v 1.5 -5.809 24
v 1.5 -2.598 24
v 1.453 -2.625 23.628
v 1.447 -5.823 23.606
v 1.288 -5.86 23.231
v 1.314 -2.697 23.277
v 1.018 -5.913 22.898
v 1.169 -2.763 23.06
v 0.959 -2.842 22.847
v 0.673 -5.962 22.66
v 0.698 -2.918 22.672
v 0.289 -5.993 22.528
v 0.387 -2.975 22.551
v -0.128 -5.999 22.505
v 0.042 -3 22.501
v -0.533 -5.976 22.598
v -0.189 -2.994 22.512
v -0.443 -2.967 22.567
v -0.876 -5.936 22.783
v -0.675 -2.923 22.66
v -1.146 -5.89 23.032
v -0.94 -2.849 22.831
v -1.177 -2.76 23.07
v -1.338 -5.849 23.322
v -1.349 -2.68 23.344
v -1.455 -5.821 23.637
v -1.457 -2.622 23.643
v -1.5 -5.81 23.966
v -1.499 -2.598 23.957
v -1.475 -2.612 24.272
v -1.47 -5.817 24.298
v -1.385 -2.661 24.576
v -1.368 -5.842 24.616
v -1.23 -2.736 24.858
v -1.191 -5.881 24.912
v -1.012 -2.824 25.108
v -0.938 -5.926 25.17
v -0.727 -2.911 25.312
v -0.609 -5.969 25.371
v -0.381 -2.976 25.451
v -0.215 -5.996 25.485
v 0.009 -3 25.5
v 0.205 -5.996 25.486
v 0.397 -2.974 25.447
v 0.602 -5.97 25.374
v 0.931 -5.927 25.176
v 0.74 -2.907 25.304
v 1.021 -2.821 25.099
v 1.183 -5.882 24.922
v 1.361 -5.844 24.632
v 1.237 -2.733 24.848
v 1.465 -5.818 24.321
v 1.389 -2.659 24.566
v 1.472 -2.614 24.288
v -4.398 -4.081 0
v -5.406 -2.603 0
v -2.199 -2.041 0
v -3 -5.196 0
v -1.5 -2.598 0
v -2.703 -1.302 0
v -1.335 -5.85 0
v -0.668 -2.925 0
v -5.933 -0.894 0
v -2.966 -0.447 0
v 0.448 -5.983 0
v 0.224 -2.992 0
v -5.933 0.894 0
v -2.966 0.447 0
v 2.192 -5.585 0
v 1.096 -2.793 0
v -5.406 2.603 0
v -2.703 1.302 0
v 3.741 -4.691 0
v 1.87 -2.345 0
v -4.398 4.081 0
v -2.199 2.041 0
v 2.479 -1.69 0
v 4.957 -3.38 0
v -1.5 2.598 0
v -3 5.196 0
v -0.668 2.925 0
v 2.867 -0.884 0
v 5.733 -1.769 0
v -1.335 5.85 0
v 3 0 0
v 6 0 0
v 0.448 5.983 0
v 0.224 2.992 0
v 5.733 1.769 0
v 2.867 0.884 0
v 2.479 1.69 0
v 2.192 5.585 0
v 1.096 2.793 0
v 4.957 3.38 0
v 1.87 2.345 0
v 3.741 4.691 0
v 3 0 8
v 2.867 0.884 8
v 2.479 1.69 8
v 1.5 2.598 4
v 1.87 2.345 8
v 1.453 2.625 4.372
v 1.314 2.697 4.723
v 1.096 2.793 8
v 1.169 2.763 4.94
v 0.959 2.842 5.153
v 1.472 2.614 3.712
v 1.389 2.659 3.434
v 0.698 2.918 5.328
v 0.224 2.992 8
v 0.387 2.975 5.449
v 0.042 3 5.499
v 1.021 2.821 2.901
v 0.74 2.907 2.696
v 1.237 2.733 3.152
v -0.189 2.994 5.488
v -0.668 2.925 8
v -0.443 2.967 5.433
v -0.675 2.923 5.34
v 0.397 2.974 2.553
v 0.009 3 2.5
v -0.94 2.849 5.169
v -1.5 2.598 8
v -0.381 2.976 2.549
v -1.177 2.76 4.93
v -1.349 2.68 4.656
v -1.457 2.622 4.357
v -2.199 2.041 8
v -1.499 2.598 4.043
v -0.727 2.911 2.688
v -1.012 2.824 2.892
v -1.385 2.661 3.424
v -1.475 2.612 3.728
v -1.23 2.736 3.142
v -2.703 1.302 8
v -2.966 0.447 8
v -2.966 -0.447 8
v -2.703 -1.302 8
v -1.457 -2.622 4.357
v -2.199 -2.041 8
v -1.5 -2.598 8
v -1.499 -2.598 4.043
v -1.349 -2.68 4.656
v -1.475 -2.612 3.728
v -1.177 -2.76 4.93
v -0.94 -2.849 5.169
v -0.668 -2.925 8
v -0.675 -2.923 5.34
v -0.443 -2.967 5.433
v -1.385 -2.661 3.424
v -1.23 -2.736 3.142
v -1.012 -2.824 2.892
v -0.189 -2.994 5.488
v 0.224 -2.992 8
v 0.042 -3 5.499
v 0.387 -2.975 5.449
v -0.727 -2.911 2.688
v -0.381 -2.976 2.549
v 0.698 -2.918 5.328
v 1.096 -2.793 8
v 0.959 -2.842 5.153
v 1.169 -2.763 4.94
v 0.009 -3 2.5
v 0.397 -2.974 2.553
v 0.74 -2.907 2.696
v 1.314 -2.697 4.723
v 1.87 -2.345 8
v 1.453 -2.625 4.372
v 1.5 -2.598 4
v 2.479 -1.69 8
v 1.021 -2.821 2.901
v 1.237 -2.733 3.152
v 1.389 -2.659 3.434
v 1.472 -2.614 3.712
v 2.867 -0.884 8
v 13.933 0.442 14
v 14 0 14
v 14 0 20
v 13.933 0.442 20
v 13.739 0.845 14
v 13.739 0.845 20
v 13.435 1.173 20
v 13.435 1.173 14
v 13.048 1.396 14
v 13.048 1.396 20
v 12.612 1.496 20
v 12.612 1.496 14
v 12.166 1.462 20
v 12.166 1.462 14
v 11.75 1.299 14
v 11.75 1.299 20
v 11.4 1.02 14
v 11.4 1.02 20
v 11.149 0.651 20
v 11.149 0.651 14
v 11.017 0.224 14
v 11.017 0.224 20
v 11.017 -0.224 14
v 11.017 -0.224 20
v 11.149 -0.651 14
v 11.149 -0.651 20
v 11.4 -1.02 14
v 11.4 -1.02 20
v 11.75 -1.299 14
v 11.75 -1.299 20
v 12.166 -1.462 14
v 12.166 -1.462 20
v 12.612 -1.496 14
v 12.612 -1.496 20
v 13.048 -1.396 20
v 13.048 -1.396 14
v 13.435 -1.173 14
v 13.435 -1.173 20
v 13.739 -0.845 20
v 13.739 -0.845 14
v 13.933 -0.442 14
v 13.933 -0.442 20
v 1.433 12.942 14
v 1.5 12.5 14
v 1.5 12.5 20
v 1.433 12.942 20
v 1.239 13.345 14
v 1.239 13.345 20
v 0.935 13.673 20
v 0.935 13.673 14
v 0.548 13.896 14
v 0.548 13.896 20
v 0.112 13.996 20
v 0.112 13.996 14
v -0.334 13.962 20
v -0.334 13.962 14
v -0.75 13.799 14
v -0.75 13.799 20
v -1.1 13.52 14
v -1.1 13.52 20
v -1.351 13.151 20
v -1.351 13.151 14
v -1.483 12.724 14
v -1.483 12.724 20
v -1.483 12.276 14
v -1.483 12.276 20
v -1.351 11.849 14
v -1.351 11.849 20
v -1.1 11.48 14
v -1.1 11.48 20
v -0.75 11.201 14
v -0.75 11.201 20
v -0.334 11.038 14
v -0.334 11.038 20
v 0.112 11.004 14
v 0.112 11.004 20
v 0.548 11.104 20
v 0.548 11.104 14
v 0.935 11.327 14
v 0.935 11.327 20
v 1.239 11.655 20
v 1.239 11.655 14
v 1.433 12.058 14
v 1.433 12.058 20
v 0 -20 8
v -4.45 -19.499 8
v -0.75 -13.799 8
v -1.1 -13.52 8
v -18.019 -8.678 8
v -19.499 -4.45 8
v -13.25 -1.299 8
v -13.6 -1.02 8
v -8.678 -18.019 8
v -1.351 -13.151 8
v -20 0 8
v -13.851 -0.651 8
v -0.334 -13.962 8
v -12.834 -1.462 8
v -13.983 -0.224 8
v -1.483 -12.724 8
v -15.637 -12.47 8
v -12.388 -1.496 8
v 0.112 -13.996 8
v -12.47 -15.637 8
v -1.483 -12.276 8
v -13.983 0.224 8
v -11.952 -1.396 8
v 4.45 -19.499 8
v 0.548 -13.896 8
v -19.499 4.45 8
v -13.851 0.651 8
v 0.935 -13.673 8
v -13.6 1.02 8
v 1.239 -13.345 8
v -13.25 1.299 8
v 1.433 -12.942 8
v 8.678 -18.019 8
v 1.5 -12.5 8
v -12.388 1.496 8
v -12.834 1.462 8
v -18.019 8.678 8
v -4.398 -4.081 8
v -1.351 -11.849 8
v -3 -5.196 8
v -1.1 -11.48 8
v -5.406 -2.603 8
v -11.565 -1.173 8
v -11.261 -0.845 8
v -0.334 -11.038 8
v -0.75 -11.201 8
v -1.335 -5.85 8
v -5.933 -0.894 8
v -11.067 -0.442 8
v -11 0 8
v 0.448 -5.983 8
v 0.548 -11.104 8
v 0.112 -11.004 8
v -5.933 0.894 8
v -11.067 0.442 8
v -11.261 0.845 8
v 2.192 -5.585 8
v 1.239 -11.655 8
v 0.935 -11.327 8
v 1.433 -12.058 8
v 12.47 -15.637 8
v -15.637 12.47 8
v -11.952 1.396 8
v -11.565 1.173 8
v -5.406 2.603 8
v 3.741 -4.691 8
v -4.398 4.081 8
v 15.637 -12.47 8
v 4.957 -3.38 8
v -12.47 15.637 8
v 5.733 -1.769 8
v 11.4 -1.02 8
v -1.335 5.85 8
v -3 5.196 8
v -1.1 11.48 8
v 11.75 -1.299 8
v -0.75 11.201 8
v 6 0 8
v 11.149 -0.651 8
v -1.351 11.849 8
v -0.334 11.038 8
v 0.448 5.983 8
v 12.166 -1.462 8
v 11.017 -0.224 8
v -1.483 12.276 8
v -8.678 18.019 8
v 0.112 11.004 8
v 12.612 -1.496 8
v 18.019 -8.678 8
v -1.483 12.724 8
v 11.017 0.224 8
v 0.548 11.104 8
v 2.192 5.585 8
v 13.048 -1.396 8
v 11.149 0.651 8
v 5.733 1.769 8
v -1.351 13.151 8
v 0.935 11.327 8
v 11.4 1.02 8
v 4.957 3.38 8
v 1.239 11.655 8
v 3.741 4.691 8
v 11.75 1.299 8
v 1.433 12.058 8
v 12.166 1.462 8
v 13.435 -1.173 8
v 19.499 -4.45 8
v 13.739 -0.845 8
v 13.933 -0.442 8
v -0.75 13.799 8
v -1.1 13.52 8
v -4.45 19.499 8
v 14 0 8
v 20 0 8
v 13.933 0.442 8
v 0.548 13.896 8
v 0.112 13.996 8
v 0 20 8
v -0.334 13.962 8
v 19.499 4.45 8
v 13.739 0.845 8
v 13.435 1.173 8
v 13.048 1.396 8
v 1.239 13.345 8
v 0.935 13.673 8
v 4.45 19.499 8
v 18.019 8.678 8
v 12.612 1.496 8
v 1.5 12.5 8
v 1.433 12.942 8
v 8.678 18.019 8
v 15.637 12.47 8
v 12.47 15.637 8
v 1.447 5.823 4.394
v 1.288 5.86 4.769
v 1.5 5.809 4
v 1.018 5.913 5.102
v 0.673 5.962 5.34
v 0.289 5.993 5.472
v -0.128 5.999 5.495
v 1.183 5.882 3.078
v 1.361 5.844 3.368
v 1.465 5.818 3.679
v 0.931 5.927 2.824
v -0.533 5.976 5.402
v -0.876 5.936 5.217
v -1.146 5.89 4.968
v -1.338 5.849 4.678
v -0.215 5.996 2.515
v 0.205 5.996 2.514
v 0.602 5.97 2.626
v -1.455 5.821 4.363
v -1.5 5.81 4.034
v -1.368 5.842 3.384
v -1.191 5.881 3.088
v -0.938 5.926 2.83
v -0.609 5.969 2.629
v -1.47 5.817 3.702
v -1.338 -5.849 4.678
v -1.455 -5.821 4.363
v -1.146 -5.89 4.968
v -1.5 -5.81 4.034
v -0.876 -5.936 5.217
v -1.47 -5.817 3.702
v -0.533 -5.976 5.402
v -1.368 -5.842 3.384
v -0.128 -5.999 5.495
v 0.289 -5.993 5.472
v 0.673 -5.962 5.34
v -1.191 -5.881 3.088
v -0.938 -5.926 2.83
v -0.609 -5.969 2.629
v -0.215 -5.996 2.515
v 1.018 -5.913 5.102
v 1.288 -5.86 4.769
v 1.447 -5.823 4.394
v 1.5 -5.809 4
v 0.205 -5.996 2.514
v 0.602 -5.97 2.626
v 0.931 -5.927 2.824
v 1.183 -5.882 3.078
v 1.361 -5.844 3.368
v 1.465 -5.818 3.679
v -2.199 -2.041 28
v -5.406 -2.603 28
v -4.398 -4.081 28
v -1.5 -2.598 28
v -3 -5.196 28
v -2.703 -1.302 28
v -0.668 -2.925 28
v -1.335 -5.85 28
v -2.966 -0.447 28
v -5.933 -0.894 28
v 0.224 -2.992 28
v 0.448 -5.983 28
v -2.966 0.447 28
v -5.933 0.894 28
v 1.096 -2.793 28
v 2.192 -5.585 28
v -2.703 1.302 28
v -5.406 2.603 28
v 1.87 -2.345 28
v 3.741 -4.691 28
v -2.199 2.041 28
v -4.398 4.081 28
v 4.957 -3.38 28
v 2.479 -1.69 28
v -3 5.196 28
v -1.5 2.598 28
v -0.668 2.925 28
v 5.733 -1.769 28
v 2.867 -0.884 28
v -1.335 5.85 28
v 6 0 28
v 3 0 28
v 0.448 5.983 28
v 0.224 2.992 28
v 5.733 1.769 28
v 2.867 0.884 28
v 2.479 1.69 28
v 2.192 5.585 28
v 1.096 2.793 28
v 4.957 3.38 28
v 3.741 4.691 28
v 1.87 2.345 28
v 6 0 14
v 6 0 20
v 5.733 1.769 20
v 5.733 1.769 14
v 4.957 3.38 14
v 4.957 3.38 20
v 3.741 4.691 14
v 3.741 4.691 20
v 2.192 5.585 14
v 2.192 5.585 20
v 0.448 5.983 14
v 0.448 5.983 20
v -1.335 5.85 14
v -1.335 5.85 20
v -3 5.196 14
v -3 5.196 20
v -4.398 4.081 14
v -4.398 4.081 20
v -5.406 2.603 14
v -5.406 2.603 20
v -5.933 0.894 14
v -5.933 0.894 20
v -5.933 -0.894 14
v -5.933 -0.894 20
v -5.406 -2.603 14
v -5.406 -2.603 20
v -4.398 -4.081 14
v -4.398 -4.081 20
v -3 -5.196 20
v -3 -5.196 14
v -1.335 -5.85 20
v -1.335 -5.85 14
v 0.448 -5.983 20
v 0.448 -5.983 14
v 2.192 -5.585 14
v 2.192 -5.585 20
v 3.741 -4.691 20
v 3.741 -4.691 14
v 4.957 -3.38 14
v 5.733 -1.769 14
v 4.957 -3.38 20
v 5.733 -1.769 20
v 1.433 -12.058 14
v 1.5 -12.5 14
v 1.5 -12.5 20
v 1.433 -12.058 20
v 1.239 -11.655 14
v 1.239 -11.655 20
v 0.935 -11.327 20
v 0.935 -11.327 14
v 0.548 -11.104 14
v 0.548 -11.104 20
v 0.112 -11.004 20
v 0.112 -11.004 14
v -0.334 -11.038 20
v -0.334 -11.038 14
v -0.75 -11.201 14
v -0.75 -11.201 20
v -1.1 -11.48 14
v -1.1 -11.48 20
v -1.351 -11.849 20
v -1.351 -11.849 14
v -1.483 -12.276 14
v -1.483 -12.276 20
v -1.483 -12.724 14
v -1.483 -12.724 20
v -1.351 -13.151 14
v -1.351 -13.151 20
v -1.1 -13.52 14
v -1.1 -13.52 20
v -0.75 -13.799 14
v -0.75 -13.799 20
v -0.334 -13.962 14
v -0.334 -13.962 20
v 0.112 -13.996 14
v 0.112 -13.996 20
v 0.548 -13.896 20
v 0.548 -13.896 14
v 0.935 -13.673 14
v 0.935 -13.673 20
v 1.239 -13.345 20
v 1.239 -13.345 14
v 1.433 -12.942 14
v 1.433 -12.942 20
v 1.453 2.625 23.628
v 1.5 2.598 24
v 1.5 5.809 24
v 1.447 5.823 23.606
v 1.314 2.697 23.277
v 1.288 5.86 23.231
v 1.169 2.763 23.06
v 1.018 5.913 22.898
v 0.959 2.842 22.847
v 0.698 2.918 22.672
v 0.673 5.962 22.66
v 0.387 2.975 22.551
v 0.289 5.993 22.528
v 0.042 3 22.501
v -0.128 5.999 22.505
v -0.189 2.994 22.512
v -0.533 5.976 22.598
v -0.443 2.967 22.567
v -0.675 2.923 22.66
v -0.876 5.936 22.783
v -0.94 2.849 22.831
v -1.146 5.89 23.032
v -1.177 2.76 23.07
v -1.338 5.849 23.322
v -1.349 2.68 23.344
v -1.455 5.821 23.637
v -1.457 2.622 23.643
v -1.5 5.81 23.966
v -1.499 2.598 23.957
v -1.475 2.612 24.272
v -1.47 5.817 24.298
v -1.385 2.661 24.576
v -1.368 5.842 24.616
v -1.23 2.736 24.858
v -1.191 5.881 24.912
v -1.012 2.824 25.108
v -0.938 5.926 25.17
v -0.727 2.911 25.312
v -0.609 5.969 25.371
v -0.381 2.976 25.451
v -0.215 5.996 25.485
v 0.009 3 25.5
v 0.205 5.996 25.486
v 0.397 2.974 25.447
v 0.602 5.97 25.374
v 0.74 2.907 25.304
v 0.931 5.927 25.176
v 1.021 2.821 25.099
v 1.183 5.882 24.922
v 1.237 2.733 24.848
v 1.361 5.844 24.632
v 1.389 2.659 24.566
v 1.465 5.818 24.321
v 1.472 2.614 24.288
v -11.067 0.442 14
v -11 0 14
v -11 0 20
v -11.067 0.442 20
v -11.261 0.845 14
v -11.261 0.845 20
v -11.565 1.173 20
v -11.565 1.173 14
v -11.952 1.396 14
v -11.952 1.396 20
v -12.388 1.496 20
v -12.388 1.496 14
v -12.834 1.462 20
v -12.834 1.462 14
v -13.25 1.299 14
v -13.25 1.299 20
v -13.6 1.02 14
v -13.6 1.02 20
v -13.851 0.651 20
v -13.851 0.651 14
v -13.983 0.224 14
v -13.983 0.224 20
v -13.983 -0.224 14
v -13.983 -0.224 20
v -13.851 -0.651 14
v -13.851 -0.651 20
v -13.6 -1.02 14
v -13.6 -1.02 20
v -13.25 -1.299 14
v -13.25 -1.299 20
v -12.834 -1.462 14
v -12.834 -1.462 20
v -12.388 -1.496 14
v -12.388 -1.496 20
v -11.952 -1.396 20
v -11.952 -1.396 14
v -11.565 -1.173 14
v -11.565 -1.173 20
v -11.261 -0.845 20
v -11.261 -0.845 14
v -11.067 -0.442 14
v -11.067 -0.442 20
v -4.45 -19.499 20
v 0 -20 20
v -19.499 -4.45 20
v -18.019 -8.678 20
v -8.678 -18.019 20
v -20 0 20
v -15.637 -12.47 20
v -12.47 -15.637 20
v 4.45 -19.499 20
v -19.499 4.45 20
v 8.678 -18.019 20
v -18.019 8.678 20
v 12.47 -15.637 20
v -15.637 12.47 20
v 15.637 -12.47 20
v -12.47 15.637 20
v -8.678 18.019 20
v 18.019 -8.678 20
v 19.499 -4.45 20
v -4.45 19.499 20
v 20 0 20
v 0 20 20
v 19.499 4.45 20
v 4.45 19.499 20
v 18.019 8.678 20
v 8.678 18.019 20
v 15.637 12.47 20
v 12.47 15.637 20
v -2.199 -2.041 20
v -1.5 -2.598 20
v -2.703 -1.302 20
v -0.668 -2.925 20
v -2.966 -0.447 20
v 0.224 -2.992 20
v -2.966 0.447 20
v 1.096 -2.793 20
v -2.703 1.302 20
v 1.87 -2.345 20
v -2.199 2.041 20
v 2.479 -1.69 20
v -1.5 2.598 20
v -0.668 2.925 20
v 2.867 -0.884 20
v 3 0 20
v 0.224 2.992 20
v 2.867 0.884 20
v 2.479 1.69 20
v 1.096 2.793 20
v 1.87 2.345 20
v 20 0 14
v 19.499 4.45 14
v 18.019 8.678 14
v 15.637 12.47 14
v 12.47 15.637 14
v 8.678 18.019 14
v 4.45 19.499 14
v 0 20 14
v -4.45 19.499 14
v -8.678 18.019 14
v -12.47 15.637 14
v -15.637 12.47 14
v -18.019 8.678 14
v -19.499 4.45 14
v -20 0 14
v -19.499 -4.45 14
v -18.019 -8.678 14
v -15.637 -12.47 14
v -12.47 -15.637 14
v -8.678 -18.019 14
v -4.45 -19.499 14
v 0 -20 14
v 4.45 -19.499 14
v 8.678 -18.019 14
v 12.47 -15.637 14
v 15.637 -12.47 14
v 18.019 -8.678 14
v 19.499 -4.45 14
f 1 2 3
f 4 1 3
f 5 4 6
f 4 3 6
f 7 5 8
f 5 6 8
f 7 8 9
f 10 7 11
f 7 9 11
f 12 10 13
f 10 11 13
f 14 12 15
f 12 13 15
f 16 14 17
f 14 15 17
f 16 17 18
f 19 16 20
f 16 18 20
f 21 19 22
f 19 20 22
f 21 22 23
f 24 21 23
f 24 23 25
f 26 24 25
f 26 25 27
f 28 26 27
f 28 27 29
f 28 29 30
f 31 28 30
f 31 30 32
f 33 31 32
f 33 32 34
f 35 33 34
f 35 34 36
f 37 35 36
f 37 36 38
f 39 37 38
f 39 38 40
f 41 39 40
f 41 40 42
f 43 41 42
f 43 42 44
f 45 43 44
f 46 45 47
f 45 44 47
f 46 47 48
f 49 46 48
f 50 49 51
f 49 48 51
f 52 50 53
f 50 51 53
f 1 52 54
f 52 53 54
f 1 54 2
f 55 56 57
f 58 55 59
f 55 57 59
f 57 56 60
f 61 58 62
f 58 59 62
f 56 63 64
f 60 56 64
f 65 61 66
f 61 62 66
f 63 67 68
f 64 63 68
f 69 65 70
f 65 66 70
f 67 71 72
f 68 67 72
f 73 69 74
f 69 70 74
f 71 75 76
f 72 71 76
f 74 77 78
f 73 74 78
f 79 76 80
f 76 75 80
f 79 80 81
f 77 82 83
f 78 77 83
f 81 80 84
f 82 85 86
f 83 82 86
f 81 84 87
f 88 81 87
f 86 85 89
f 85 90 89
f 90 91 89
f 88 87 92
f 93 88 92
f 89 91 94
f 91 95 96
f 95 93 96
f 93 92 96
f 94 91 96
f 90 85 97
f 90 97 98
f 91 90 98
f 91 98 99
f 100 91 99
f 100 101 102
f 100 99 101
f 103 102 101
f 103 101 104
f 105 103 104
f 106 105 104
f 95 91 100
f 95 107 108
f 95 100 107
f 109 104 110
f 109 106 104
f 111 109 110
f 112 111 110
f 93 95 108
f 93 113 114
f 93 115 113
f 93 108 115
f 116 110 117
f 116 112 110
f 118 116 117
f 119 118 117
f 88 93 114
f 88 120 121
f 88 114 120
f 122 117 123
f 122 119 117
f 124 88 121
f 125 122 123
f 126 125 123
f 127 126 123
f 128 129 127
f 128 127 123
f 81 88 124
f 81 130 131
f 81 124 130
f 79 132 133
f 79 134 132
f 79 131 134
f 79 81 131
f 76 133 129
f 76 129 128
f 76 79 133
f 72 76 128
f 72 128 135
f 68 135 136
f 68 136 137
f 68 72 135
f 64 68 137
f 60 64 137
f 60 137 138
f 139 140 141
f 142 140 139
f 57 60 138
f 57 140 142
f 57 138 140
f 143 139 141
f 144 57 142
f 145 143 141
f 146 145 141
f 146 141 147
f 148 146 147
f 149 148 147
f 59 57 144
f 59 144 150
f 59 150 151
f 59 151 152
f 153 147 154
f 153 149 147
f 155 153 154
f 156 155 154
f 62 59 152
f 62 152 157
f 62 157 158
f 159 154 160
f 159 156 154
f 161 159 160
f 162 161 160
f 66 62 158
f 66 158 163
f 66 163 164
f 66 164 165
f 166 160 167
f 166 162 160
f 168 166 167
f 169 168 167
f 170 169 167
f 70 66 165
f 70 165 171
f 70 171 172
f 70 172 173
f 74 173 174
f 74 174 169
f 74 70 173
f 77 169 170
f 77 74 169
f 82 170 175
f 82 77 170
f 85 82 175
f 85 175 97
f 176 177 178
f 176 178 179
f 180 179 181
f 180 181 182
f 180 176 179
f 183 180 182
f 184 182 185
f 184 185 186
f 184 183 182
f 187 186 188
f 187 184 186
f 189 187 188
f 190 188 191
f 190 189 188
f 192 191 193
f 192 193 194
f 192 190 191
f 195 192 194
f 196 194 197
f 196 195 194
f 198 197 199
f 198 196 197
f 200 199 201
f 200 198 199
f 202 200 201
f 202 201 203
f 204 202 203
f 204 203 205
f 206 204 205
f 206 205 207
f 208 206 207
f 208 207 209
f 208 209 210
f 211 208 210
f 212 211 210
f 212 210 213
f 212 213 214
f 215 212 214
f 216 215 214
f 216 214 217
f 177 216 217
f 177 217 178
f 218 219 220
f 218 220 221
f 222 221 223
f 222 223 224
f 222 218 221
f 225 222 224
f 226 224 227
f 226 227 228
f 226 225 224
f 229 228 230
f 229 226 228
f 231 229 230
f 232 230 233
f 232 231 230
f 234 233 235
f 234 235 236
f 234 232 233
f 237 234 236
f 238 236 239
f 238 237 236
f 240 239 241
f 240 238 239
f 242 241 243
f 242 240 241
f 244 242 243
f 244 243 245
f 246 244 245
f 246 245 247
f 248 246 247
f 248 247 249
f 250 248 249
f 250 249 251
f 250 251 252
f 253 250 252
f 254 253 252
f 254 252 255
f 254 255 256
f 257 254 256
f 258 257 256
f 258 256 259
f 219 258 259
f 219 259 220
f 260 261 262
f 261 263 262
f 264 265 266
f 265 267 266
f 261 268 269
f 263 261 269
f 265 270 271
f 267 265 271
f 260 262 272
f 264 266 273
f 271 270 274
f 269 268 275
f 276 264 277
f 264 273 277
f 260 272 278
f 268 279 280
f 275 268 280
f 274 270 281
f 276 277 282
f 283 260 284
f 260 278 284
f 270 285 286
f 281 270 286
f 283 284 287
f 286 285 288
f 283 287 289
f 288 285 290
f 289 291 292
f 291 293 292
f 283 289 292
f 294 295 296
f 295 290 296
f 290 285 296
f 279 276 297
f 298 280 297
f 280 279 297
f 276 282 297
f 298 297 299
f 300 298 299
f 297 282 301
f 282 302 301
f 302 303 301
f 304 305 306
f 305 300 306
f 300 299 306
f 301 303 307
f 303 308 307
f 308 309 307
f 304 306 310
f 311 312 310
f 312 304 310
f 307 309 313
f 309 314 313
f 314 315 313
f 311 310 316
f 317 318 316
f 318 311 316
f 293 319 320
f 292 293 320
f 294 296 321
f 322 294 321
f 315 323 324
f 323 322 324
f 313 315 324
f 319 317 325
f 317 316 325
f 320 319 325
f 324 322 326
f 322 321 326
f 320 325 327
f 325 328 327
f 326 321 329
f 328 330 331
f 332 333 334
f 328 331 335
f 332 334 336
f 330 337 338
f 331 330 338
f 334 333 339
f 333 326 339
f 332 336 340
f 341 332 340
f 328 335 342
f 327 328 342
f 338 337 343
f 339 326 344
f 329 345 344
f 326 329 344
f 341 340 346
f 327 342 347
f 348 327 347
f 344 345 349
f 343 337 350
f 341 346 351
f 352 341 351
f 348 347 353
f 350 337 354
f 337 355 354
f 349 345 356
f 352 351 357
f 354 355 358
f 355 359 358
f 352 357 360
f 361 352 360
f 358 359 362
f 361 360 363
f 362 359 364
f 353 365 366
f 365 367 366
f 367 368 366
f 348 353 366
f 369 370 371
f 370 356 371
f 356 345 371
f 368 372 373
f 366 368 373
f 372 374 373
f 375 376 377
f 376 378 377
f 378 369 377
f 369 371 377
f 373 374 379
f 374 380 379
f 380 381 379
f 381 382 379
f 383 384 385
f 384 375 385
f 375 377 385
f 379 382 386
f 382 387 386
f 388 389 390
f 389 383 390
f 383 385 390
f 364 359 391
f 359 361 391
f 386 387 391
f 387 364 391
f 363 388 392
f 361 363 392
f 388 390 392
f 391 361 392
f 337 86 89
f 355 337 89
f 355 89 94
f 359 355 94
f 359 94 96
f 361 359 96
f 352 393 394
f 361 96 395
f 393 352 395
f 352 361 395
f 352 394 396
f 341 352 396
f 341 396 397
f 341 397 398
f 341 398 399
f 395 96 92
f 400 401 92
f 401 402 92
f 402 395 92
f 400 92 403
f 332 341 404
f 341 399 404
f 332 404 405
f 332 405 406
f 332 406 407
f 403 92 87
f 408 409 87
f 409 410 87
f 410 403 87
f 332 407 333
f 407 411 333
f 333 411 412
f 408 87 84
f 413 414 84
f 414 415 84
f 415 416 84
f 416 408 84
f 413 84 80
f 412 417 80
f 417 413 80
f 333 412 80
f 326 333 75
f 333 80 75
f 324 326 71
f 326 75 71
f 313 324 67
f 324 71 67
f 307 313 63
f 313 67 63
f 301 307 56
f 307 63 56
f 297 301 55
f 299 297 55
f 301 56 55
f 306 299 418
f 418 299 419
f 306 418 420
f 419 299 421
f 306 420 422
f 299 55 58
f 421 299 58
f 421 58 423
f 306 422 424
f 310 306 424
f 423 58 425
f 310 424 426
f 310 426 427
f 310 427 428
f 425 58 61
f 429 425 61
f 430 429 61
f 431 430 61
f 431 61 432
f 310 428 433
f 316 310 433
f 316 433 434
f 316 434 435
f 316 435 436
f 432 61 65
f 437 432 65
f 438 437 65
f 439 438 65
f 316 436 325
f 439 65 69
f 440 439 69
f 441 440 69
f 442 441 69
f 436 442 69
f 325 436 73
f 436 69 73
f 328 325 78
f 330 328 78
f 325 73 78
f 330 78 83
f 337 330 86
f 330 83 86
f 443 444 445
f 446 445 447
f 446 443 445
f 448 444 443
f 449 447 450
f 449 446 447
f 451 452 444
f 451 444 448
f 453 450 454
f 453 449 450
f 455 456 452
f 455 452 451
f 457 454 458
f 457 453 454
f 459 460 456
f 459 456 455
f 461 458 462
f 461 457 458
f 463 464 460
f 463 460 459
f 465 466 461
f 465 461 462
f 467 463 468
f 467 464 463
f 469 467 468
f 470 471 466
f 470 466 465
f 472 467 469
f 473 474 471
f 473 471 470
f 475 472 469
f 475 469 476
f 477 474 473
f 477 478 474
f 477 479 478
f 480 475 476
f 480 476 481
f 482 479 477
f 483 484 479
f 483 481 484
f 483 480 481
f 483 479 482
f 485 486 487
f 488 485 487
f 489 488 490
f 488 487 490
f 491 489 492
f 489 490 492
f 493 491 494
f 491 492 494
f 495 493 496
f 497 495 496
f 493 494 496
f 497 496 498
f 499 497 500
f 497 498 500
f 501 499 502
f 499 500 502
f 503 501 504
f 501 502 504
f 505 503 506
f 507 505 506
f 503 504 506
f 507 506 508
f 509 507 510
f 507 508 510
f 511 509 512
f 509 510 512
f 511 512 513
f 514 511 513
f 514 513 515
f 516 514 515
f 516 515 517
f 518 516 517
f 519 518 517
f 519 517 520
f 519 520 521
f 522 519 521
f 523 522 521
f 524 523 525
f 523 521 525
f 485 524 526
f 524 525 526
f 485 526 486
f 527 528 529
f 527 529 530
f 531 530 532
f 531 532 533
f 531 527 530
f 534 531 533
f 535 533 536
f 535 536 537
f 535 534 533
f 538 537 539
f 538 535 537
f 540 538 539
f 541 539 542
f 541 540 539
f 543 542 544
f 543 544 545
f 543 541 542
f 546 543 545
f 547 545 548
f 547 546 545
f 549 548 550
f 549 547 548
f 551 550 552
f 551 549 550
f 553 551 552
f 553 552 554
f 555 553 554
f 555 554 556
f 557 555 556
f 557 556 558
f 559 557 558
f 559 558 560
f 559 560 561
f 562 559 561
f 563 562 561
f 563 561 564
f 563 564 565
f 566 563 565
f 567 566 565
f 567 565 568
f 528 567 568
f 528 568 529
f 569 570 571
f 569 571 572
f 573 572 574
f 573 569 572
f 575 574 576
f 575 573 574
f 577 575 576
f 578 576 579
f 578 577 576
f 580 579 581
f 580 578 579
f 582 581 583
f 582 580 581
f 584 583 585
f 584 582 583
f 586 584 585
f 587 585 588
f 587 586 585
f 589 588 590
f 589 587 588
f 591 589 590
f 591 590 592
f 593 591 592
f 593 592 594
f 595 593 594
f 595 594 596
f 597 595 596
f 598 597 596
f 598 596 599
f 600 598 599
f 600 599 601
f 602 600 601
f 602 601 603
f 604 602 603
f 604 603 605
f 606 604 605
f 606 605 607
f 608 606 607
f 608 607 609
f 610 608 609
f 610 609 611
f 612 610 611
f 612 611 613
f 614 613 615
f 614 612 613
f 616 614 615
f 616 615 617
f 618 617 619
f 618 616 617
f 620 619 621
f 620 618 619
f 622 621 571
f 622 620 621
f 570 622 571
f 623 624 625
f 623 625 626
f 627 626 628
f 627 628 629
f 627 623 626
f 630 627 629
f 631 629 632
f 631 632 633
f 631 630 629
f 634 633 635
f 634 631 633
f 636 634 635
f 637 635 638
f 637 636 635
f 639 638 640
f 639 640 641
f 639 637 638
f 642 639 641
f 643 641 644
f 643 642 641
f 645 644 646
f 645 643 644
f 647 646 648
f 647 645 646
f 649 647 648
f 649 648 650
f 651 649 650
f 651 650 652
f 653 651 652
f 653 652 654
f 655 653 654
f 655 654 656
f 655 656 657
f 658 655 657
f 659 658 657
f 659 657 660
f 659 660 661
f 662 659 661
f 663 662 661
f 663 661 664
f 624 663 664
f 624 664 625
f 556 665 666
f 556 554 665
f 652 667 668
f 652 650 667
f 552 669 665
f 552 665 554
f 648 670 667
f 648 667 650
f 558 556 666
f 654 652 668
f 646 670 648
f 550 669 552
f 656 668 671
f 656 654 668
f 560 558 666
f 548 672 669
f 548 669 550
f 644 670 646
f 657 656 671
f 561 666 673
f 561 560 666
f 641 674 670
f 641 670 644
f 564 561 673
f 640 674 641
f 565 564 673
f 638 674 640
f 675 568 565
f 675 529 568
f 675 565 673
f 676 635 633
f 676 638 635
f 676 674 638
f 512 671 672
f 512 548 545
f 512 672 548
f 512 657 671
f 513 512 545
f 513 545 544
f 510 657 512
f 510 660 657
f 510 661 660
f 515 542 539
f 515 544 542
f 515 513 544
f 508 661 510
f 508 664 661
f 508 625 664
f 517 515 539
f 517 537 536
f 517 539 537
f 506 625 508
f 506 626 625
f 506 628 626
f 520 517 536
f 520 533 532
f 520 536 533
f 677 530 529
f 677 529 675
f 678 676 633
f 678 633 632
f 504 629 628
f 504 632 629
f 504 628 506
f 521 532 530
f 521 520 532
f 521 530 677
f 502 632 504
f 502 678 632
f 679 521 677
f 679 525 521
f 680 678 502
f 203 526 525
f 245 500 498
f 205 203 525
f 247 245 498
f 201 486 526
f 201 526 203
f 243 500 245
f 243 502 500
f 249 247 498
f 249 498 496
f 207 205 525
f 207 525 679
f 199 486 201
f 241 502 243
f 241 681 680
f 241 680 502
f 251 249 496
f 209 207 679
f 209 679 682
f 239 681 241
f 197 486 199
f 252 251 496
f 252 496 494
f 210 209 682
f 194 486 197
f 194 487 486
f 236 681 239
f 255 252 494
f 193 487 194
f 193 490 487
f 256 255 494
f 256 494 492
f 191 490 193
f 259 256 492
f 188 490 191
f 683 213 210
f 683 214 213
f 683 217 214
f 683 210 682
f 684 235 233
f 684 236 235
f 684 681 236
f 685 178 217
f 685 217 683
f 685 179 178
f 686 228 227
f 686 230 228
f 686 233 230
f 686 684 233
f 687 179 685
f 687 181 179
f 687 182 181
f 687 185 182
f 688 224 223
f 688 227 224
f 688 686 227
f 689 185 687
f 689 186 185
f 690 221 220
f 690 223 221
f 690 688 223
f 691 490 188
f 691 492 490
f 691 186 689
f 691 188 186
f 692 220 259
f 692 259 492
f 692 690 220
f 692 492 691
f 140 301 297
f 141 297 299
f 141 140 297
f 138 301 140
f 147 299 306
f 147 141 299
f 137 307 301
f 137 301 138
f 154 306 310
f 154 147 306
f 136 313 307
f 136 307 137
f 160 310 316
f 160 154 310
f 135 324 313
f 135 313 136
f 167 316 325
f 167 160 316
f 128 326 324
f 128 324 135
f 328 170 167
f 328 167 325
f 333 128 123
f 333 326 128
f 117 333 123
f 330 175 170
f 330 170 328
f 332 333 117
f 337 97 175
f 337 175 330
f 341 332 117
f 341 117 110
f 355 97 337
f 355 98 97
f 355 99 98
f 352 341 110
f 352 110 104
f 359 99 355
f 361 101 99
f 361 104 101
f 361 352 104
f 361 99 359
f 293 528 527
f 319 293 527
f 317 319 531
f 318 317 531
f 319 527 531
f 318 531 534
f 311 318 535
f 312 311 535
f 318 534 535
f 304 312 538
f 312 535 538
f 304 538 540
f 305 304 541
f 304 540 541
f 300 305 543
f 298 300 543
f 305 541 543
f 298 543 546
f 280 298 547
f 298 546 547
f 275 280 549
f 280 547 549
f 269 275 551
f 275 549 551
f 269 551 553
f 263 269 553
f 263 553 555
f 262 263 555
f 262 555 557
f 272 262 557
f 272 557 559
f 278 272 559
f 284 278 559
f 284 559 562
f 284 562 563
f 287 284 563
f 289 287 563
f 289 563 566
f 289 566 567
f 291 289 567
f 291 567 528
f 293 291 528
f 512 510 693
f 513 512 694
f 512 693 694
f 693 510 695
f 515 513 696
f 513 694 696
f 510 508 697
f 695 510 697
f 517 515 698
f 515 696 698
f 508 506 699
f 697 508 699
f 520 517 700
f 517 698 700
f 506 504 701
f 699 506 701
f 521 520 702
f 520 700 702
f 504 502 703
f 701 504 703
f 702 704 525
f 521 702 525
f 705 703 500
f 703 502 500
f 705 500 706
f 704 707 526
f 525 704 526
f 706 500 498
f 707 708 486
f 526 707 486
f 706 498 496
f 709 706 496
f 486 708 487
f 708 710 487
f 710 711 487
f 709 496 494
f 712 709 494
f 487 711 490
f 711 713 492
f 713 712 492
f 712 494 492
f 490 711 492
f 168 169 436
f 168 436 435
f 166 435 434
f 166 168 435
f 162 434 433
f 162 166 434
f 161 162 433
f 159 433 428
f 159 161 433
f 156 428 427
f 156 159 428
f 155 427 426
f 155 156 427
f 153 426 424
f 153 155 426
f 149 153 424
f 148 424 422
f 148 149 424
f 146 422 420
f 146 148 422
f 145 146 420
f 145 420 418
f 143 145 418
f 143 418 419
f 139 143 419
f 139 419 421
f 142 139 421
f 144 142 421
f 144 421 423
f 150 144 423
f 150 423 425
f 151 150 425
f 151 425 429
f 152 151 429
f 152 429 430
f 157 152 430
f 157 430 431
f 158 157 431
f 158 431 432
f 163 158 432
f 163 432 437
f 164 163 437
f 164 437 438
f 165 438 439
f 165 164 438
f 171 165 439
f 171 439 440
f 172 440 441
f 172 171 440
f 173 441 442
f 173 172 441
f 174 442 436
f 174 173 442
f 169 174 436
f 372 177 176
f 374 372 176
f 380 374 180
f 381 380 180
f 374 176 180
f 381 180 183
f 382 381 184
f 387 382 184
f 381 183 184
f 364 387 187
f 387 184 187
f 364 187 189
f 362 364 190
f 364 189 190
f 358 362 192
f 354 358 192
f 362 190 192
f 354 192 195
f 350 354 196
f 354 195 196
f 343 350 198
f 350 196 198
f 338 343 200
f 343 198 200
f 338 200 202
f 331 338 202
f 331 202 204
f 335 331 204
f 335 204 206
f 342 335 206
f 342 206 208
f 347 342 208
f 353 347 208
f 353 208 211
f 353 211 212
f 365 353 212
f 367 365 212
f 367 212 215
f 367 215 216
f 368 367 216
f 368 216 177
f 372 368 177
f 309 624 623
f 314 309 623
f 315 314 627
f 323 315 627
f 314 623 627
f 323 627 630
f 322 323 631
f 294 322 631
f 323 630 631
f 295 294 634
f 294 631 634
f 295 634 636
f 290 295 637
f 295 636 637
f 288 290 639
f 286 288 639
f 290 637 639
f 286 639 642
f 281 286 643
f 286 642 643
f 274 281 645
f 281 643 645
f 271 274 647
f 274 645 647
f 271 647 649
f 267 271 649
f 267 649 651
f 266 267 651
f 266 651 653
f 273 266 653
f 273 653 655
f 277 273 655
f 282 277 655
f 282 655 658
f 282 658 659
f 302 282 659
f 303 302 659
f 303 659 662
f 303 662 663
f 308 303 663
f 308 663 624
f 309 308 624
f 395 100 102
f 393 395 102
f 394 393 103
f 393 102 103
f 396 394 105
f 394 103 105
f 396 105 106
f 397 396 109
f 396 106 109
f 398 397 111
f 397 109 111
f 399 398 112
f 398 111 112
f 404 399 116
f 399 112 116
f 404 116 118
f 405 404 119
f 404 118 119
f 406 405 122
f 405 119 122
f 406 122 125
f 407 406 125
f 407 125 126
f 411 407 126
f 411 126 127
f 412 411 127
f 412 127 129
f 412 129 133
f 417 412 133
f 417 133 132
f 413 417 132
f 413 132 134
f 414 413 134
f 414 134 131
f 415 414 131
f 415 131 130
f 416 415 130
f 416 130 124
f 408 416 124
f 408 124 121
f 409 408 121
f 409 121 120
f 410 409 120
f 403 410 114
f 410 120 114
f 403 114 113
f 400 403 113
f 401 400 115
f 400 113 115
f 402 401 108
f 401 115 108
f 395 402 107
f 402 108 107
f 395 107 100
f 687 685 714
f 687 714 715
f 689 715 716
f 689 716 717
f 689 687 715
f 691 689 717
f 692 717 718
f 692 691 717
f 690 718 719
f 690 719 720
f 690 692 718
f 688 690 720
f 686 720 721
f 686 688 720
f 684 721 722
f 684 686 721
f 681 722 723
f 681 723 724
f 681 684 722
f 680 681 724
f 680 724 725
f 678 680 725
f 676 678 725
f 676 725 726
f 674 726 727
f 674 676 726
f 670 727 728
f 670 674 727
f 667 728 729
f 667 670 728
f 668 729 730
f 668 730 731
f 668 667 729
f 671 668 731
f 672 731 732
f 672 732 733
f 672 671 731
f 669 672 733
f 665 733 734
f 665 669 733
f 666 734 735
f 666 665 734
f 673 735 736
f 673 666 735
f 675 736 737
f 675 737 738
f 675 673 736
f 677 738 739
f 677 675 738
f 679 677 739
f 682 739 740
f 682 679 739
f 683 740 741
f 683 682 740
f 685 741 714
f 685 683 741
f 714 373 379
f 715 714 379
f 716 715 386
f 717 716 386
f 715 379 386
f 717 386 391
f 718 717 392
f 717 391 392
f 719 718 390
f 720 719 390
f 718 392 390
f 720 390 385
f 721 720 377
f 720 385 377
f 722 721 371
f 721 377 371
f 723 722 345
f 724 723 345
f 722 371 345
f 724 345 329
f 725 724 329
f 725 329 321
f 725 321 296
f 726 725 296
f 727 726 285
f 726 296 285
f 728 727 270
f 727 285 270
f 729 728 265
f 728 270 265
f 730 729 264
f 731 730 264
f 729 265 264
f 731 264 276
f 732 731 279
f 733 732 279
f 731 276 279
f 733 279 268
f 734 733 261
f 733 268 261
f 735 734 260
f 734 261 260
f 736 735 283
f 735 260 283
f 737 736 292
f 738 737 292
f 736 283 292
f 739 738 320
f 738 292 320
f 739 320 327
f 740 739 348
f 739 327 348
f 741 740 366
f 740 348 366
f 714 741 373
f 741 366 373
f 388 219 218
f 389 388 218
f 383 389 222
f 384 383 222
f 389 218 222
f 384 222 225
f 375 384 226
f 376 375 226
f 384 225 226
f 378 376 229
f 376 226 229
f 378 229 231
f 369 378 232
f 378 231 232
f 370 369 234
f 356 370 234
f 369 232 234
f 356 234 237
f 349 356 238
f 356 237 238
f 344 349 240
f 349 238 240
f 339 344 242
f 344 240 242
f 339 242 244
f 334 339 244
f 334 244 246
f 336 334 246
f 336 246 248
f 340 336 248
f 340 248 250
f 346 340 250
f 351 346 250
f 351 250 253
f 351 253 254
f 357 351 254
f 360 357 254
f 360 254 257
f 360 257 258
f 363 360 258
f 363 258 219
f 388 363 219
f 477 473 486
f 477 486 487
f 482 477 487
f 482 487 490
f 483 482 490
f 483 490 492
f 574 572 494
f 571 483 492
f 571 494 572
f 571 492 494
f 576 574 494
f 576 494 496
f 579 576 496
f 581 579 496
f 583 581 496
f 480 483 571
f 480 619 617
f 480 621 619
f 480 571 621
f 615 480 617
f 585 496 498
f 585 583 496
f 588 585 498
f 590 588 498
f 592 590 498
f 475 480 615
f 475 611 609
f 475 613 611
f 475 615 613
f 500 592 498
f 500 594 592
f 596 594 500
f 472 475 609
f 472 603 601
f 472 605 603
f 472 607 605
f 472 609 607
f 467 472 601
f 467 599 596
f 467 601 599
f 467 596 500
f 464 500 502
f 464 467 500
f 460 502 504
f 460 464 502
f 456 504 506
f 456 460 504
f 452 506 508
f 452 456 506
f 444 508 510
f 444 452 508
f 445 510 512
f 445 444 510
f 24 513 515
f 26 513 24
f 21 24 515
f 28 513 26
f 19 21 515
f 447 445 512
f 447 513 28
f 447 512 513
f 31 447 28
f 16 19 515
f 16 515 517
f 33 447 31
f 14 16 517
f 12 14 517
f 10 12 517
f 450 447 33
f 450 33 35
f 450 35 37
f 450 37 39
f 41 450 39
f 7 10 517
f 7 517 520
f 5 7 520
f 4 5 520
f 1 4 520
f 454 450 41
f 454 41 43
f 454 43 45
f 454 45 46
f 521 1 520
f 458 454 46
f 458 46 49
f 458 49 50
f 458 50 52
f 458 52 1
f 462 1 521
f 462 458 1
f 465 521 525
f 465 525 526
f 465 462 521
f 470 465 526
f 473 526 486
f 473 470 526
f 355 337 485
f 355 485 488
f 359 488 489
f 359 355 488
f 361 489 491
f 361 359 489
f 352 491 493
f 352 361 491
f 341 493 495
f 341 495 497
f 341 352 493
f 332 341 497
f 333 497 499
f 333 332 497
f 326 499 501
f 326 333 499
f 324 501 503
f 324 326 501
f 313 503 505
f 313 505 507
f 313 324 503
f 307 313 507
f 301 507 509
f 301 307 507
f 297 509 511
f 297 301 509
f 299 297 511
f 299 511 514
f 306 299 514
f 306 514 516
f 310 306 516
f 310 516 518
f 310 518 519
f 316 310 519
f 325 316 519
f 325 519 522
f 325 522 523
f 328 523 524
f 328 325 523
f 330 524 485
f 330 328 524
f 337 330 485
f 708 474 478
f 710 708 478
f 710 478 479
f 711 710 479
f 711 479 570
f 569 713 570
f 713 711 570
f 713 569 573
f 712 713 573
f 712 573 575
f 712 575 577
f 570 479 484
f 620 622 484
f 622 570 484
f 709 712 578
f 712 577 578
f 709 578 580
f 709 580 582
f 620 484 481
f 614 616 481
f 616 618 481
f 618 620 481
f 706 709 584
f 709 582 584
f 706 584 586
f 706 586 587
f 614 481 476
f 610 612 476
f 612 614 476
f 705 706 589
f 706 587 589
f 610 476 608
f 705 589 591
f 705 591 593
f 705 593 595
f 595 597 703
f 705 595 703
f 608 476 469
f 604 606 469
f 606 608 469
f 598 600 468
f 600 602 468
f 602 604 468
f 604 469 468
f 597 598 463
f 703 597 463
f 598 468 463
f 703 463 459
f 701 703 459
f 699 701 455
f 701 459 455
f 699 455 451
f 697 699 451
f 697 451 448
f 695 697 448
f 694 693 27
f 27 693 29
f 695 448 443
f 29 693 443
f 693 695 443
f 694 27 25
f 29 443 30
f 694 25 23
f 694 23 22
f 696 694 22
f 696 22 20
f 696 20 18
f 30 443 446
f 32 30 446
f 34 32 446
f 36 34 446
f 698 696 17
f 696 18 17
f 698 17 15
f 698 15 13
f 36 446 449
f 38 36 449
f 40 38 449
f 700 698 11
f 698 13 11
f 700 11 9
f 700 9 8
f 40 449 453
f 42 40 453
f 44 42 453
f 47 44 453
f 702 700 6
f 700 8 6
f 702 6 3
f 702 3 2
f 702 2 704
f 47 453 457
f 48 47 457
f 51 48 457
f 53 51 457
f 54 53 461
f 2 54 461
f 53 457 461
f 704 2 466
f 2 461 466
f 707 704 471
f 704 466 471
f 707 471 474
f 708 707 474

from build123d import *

# Parameters (mm, degrees)
F0_R          = 6
F0_R_2        = 3
F1_DEPTH      = 8
F2_R          = 20
F2_R_2        = 6
F3_DEPTH      = 6
F4_R          = 1.5
F5_DEPTH      = 20.001
F5_DEPTH_BACK = 20.001
F6_R          = 1.5
F7_DEPTH      = 14.0010001


with BuildPart() as f1:
    # F0 (on Top) → F1 (new body)
    with BuildSketch(Plane.XY):
        Circle(F0_R)
        Circle(F0_R_2, mode=Mode.SUBTRACT)
    extrude(amount=F1_DEPTH)

    # F4 (on Front) → F5 (cut, two sides)
    with BuildSketch(Plane.XZ) as f5_sk:
        with Locations((0, 4)):
            Circle(F4_R)
    extrude(amount=-F5_DEPTH, mode=Mode.SUBTRACT)
    extrude(f5_sk.sketch, amount=F5_DEPTH_BACK, mode=Mode.SUBTRACT)


with BuildPart() as f3:
    # F2 (on face) → F3 (new body)
    with BuildSketch(Plane.XY.offset(8)):
        Circle(F2_R)
        Circle(F2_R_2, mode=Mode.SUBTRACT)
    extrude(amount=F3_DEPTH)

    # F6 (on face) → F7 (cut, through all)
    with BuildSketch(Plane.XY.offset(14)):
        with Locations((0, 12.5)):
            Circle(F6_R)
        with Locations((0, -12.5)):
            Circle(F6_R)
        with Locations((-12.5, 0)):
            Circle(F6_R)
        with Locations((12.5, 0)):
            Circle(F6_R)
    extrude(amount=-F7_DEPTH, mode=Mode.SUBTRACT)

    # F8: F3, F1 across face


with BuildPart() as f3_1:
    add(f3.part)
    add(f3.part.mirror(Plane.XY.offset(14)))
    add(f1.part.mirror(Plane.XY.offset(14)))


solid = Compound([f1.part, f3_1.part])
